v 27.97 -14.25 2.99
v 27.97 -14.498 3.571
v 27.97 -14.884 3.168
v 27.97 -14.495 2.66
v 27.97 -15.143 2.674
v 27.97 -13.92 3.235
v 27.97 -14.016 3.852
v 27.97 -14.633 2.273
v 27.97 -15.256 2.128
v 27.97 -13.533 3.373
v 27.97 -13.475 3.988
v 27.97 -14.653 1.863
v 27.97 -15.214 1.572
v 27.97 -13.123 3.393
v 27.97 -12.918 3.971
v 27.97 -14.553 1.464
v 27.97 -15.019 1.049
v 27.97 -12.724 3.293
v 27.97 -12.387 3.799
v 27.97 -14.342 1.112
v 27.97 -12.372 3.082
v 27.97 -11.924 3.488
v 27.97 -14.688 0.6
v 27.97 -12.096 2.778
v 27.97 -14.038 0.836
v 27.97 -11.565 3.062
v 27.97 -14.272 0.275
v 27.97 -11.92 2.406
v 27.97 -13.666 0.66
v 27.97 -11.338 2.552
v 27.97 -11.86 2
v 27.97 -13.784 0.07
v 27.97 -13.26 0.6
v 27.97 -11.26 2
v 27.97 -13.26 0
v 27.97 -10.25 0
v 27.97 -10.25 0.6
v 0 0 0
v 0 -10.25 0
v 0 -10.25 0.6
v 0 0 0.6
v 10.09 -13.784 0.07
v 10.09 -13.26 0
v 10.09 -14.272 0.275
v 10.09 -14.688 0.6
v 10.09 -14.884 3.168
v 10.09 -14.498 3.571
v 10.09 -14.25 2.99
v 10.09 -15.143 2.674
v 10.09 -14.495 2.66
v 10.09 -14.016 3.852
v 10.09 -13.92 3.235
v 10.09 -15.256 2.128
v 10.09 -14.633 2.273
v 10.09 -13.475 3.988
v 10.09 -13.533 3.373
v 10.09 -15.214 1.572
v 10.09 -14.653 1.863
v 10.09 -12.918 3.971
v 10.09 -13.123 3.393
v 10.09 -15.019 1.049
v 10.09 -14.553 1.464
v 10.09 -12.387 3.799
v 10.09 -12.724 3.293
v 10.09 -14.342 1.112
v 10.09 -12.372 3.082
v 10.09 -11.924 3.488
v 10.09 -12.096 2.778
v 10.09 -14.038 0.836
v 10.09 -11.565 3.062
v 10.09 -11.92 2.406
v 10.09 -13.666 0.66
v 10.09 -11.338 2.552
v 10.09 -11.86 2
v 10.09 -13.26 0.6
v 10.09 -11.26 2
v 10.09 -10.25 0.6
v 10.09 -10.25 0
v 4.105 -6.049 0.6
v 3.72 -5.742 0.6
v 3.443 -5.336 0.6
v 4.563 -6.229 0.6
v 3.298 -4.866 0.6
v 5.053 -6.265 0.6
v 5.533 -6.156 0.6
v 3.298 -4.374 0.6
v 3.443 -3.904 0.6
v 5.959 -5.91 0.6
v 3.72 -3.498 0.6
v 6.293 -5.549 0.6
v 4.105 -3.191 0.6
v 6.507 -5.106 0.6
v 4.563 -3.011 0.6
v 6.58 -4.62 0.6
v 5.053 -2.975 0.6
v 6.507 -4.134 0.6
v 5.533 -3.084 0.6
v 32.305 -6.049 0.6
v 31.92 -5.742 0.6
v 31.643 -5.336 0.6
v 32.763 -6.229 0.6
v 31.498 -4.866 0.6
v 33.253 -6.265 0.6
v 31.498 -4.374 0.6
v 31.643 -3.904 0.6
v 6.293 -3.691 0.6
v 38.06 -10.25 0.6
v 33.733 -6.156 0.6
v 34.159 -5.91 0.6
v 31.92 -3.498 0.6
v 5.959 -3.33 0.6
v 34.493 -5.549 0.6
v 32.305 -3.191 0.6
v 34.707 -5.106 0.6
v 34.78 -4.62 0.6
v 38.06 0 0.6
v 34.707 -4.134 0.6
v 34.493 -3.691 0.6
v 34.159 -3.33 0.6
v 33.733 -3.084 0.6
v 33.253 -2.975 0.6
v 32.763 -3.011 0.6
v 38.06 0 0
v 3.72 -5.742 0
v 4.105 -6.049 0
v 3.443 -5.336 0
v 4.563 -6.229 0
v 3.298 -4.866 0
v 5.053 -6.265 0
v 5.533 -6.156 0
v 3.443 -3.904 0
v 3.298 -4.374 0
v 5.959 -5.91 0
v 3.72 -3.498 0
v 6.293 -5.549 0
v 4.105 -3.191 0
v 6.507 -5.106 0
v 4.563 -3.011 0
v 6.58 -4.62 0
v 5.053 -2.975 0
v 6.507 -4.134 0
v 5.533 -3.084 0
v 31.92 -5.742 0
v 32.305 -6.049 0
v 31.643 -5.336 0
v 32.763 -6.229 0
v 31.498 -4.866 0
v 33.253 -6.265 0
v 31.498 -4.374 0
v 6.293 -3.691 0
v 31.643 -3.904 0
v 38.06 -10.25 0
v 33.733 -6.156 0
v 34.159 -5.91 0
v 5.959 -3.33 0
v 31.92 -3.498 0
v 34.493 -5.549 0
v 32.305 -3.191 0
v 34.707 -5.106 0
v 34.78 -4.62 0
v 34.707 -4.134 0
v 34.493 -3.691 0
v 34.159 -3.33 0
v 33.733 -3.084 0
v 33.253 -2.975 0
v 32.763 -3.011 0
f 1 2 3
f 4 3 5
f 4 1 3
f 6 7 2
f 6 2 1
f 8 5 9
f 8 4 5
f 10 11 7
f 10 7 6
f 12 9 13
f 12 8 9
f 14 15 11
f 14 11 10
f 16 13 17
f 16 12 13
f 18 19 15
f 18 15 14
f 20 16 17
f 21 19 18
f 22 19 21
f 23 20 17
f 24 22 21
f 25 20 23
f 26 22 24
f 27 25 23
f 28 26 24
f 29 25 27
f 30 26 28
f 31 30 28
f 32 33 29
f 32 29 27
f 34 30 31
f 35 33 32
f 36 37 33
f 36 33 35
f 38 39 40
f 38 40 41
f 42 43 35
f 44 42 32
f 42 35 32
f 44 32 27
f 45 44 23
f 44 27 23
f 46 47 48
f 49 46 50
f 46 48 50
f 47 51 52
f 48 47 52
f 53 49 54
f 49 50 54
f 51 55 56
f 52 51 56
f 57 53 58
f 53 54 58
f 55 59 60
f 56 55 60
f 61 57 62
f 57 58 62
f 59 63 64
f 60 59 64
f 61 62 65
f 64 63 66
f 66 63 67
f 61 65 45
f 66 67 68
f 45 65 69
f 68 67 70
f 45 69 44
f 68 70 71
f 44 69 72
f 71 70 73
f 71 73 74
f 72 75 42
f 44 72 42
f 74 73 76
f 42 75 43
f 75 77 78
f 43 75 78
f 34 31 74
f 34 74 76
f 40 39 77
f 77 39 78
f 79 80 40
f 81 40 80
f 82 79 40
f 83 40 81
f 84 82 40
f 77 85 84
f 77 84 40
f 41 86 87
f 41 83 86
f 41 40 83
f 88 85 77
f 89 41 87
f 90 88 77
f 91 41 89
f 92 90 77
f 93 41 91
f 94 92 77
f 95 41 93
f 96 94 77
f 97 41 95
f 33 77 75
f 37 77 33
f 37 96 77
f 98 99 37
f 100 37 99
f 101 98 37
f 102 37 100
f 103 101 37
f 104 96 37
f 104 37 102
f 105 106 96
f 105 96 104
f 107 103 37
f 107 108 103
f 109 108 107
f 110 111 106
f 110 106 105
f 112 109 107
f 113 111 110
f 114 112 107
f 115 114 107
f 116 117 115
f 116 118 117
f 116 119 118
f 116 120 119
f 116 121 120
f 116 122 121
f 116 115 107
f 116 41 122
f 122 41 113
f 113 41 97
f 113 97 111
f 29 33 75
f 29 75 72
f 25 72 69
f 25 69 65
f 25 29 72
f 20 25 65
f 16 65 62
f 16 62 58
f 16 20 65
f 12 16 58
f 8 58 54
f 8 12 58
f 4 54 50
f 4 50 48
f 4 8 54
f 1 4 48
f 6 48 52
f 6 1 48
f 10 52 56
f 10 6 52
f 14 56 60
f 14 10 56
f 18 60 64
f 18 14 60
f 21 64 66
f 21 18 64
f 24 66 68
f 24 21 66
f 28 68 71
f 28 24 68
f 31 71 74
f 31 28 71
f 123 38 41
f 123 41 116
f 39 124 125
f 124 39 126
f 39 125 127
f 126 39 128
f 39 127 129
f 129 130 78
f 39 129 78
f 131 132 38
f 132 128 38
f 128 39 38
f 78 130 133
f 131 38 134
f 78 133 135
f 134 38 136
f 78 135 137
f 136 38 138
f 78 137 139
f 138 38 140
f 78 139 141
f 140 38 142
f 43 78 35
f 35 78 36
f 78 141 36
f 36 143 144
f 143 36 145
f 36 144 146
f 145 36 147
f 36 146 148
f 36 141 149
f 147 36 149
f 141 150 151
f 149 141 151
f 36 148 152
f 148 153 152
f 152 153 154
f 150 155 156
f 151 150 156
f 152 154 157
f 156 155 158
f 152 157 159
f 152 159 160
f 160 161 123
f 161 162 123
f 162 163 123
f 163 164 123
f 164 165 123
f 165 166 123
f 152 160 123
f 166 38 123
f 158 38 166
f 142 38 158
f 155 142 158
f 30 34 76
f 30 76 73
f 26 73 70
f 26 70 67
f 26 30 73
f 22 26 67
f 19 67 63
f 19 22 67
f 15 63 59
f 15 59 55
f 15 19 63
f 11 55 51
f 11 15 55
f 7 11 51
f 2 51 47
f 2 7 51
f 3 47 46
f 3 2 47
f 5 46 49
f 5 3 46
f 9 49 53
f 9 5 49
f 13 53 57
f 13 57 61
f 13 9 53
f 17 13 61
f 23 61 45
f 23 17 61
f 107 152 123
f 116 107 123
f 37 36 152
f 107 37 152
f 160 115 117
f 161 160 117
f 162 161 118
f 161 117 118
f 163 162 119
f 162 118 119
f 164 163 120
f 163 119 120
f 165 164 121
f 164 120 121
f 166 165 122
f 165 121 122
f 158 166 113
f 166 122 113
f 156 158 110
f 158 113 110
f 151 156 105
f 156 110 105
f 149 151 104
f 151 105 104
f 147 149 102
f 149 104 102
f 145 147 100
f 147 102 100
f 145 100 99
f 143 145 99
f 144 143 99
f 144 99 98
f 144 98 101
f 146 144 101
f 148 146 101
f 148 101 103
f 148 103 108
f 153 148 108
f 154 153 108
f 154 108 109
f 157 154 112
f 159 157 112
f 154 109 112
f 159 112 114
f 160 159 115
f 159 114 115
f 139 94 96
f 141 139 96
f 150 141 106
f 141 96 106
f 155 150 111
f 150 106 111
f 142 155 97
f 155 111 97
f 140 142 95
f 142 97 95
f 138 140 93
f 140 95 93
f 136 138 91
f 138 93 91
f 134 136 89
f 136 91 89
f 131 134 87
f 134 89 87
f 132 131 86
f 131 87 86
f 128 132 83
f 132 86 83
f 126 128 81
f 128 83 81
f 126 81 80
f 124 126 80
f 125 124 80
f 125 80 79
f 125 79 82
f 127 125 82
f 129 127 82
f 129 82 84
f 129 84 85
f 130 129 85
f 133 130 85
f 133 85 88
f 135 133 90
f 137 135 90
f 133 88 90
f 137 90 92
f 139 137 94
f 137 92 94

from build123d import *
from build123d.topology import SkipClean

# Parameters (mm, degrees)
SKETCH1_W           = 38.06
SKETCH1_H           = 10.25
BOSS_EXTRUDE1_DEPTH = 0.6
SKETCH2_R           = 1.65
CUT_EXTRUDE1_DEPTH  = 0.6
SKETCH3_W           = 17.88
SKETCH3_H           = 0.6
BOSS_EXTRUDE2_DEPTH = 5.01
BOSS_EXTRUDE3_DEPTH = 17.88
CUT_EXTRUDE2_DEPTH  = 17.88


with BuildPart() as part:
    # Sketch1 → Boss-Extrude1 (new body)
    with BuildSketch(Plane.XY):
        with Locations((19.03, -5.125)):
            Rectangle(SKETCH1_W, SKETCH1_H)
    extrude(amount=BOSS_EXTRUDE1_DEPTH)

    # Sketch2 → Cut-Extrude1 (cut)
    with BuildSketch(Plane.XY.offset(0.6)):
        with Locations((4.93, -4.62)):
            Circle(SKETCH2_R)
        with Locations((33.13, -4.62)):
            Circle(SKETCH2_R)
    extrude(amount=-CUT_EXTRUDE1_DEPTH, mode=Mode.SUBTRACT)

    # Sketch3 → Boss-Extrude2 (add)
    with BuildSketch(Plane.XZ.offset(10.25)):
        with Locations((19.03, 0.3)):
            Rectangle(SKETCH3_W, SKETCH3_H)
    extrude(amount=BOSS_EXTRUDE2_DEPTH)

    # Sketch4 → Boss-Extrude3 (add)
    with BuildSketch(Plane(origin=(27.97, 0, 0), x_dir=(0, 0, -1), z_dir=(1, 0, 0))):
        with BuildLine():
            Line((-2, -11.86), (-2, -11.26))
            ThreePointArc((-2, -11.26), (-3.414213562, -14.674213562), (0, -13.26))
            Line((0, -13.26), (-0.6, -13.26))
            ThreePointArc((-0.6, -13.26), (-2.989949494, -14.249949494), (-2, -11.86))
        make_face()
    extrude(amount=-BOSS_EXTRUDE3_DEPTH)

    # Sketch5 → Cut-Extrude2 (cut)
    with SkipClean():  # the faces are left unmerged after this step: merging them gives an invalid solid
        with BuildSketch(Plane(origin=(27.97, 0, 0), x_dir=(0, 0, -1), z_dir=(1, 0, 0))):
            with BuildLine():
                ThreePointArc((0, -13.26), (-0.156091109, -14.034596669), (-0.6, -14.688285686))
                Line((-0.6, -14.688285686), (-0.6, -15.26))
                Line((-0.6, -15.26), (0, -15.26))
                Line((0, -15.26), (0, -13.26))
            make_face()
        extrude(amount=-CUT_EXTRUDE2_DEPTH, mode=Mode.SUBTRACT)


solid = part.part
